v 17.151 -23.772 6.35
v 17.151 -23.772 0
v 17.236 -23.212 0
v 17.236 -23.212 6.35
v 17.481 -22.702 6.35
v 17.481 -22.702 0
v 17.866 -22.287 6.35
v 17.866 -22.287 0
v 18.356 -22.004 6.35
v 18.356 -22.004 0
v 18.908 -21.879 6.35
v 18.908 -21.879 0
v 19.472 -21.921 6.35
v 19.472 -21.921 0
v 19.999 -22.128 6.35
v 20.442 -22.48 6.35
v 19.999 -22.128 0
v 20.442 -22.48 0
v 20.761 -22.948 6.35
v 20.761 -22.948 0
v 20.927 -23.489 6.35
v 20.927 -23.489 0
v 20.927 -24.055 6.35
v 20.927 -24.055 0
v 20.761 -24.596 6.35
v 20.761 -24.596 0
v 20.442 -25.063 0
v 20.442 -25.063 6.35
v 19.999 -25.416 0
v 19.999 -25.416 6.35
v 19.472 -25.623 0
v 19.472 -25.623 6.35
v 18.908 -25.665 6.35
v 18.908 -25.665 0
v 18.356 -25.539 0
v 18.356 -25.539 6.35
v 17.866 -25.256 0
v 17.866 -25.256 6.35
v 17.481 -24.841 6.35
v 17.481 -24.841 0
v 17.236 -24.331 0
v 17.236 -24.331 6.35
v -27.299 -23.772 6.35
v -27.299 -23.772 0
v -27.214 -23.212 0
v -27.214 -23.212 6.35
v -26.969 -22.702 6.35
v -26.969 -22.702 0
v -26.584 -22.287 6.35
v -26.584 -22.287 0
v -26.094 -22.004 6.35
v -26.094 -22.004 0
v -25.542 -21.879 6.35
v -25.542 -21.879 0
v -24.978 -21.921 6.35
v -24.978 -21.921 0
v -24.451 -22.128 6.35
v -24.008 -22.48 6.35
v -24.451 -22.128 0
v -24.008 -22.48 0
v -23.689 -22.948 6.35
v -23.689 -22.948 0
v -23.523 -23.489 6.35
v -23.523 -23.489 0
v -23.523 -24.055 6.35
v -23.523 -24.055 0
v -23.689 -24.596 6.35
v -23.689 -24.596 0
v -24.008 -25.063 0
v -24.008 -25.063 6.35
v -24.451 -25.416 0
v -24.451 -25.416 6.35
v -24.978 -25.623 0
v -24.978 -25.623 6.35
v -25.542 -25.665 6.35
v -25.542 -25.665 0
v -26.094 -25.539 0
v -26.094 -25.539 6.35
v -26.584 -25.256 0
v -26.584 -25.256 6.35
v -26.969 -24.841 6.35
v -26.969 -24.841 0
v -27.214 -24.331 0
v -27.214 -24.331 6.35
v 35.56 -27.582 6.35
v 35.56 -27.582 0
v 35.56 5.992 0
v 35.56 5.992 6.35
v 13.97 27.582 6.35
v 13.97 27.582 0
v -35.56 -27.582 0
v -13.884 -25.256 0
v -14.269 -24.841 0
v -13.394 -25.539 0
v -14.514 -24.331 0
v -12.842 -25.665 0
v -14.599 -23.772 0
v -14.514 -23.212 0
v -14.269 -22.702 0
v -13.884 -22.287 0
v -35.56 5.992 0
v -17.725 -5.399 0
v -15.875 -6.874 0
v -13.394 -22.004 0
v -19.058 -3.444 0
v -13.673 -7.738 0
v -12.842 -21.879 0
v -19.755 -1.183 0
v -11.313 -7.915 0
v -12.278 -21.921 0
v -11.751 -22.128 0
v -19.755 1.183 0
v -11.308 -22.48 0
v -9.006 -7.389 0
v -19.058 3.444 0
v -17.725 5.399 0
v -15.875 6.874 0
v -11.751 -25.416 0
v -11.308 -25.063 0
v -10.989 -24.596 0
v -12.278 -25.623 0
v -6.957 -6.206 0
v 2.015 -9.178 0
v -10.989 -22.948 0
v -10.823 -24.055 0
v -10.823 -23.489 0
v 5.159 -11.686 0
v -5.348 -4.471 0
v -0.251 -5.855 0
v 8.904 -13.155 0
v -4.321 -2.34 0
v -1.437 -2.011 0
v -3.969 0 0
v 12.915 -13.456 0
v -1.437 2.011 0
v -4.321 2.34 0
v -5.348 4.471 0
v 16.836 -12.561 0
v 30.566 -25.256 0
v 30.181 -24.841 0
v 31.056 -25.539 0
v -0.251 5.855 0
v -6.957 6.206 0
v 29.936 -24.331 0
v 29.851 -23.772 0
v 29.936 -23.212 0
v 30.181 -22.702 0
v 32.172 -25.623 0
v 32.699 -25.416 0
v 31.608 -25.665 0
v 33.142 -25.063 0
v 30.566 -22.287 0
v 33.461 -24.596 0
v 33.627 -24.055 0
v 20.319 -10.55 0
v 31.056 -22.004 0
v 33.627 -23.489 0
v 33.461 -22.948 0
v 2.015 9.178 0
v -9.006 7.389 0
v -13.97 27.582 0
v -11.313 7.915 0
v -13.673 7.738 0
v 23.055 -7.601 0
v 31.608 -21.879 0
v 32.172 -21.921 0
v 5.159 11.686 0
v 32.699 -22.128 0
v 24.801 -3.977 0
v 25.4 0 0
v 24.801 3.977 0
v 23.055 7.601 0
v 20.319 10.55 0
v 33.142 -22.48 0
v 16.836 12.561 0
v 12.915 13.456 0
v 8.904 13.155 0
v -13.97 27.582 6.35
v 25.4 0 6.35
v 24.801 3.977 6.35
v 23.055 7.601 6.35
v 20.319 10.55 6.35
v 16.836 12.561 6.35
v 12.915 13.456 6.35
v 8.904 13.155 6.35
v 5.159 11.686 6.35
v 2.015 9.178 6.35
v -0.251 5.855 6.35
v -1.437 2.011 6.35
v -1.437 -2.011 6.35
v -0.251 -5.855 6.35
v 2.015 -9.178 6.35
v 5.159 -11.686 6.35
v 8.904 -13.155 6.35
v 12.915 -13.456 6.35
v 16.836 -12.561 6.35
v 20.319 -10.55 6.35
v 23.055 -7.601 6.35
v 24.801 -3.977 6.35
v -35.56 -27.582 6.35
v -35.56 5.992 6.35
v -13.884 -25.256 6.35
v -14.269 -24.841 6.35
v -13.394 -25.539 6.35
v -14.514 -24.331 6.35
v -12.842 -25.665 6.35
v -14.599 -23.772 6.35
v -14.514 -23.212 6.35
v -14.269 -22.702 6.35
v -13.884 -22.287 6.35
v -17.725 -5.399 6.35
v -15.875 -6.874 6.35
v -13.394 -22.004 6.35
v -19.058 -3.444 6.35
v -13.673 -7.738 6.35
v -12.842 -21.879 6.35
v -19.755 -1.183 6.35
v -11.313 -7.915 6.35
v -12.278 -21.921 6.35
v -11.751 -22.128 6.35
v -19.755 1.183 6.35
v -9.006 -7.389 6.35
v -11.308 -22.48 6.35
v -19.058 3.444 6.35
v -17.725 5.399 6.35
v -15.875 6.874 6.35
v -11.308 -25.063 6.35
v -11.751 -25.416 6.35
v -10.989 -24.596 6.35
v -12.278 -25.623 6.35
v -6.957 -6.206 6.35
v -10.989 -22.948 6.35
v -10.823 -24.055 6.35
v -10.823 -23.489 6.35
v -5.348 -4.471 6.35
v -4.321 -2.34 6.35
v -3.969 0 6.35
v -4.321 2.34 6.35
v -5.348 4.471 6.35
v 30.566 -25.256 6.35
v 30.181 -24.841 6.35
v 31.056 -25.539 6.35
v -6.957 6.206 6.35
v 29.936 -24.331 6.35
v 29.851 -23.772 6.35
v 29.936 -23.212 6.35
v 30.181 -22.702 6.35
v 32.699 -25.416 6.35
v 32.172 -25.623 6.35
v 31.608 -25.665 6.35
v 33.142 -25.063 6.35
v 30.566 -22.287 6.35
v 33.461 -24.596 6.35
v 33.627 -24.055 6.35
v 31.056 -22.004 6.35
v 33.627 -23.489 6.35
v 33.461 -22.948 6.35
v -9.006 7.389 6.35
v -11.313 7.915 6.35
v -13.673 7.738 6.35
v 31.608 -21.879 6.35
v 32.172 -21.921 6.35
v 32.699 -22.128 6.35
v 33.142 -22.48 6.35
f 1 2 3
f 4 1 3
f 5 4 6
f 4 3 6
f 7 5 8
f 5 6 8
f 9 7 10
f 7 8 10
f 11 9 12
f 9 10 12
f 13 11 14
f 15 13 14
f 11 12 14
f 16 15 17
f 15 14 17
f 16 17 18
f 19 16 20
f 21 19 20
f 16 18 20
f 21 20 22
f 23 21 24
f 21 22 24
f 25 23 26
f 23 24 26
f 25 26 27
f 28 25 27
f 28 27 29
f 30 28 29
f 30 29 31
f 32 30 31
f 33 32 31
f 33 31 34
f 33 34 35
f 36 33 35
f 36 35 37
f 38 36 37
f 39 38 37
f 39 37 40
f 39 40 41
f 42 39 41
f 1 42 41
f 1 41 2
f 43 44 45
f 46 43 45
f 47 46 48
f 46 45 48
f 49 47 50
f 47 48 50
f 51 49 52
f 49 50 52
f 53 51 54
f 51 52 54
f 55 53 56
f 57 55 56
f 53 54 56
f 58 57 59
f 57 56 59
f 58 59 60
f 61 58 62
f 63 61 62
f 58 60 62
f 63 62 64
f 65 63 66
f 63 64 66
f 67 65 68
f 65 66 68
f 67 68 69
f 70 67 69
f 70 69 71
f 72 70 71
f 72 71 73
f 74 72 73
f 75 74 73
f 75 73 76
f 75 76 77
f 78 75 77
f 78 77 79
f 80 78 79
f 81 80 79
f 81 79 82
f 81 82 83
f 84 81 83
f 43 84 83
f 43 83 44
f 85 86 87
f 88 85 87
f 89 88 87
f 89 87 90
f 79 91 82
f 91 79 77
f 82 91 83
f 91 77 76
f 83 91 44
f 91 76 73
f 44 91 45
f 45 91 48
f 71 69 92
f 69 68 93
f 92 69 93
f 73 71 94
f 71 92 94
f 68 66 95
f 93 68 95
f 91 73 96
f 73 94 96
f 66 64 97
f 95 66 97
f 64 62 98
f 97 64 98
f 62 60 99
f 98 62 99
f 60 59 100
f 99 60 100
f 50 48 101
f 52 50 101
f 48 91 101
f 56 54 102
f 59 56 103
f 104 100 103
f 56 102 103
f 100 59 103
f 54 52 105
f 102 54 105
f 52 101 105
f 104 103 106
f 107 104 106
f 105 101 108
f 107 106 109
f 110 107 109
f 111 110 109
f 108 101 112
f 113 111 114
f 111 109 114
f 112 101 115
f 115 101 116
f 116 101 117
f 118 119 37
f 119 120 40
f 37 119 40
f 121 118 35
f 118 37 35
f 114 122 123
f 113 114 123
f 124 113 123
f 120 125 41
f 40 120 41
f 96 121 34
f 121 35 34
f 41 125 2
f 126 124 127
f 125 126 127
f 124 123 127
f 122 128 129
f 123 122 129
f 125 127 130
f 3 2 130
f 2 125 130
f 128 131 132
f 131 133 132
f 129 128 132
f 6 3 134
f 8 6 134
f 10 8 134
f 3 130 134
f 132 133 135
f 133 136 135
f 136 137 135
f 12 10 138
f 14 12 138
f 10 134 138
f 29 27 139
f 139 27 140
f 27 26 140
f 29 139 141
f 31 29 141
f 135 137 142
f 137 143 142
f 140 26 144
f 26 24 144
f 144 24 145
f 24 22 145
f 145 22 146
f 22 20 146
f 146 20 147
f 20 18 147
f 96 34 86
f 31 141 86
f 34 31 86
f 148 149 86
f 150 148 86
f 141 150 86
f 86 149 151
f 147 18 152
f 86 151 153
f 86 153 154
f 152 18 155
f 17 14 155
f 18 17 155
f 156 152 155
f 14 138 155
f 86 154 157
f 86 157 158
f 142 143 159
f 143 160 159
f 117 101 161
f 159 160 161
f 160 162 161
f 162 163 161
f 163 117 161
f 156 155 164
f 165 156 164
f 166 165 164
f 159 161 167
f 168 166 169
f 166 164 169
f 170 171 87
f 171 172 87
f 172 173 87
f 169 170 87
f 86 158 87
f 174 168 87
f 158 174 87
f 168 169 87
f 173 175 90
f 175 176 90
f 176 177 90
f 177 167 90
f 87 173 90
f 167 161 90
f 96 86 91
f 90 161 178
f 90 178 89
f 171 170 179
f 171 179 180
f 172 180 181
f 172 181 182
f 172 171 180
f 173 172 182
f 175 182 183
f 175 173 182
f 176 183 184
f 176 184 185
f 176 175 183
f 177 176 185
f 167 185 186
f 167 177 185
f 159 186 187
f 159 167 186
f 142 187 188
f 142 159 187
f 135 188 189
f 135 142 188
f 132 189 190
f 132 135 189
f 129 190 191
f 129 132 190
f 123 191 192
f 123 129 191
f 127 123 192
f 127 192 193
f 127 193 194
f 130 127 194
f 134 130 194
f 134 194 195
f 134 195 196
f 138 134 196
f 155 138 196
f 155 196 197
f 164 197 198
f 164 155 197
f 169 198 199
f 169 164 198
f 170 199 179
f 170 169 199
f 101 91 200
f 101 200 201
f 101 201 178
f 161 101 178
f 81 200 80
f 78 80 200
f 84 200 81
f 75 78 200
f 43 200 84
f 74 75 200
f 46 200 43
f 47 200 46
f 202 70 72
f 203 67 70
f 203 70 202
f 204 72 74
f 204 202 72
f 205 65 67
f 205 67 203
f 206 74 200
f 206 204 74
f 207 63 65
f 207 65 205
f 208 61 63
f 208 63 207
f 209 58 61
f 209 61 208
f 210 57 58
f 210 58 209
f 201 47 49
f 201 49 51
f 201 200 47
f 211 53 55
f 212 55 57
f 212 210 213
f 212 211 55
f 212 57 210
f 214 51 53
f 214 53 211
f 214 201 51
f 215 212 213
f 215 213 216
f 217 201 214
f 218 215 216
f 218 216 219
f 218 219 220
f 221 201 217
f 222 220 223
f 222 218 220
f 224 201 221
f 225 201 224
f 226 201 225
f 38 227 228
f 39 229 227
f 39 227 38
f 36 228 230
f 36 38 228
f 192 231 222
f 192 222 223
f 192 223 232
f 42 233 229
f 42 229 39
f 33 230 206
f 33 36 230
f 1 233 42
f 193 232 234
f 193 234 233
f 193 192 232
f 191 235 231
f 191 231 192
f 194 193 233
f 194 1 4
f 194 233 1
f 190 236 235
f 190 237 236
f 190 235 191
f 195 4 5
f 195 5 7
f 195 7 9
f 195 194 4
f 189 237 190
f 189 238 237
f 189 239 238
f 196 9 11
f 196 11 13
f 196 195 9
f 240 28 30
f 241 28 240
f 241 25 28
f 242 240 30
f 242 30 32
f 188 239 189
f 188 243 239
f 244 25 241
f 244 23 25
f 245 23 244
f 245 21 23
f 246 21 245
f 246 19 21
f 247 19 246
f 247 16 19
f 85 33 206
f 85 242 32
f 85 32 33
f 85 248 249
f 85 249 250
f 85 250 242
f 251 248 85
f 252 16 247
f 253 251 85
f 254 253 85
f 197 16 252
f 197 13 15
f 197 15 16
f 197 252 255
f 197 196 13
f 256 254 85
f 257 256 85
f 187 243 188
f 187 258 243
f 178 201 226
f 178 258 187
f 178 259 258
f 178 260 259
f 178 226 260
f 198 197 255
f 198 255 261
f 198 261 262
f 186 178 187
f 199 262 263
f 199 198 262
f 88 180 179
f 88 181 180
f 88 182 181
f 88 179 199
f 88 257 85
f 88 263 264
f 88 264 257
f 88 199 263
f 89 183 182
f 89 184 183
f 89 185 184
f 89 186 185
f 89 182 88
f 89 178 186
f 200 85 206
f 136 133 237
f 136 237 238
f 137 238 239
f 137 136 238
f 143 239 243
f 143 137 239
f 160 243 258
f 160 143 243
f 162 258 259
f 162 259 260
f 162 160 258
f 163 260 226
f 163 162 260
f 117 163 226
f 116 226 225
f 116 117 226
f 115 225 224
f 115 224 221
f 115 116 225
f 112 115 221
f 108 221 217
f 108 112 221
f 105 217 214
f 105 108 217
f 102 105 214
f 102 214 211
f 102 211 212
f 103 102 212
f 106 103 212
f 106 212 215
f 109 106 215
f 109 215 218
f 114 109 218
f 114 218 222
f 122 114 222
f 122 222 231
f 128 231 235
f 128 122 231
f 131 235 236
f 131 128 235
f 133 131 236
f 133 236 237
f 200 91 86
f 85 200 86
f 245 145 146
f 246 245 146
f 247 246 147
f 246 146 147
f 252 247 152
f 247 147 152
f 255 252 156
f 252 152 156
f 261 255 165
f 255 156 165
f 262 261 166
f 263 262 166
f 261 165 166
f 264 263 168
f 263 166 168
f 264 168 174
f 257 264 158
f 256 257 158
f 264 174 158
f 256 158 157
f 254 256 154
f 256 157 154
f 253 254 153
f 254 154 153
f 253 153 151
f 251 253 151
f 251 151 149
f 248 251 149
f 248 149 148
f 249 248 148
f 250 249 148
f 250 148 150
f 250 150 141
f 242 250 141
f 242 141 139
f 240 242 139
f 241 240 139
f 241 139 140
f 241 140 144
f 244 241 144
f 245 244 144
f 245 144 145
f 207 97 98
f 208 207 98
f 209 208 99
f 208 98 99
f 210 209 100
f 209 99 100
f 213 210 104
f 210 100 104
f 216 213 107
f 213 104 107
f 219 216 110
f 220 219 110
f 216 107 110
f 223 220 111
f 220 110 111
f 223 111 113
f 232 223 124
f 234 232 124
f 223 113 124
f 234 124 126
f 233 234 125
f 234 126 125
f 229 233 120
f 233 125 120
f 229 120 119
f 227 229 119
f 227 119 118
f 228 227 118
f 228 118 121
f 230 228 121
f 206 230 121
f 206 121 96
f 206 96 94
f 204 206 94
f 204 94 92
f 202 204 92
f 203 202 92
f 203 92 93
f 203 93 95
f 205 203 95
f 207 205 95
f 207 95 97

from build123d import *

# Parameters (mm, degrees)
SKETCH1_W             = 71.12
SKETCH1_H             = 55.16372
SKETCH1_R             = 13.49375
SKETCH1_R_2           = 7.9375
BOSS_EXTRUDE1_DEPTH   = 6.35
F_6_CLEARANCE_HOLE1_D = 3.7973
CUT_EXTRUDE1_DEPTH    = 46.448818478


with BuildPart() as part:
    # Sketch1 → Boss-Extrude1 (new body)
    with BuildSketch(Plane.XY):
        Rectangle(SKETCH1_W, SKETCH1_H)
        with Locations((11.90625, 0)):
            Circle(SKETCH1_R, mode=Mode.SUBTRACT)
        with Locations((-11.90625, 0)):
            Circle(SKETCH1_R_2, mode=Mode.SUBTRACT)
    extrude(amount=BOSS_EXTRUDE1_DEPTH)

    # #6 Clearance Hole1 (through all)
    with Locations(Plane.XY.offset(6.35)):
        with Locations((-25.4, -23.77186), (-12.7, -23.77186), (19.05, -23.77186), (31.75, -23.77186)):
            Hole(F_6_CLEARANCE_HOLE1_D / 2)

    # Sketch4 → Cut-Extrude1 (cut, through all)
    with BuildSketch(Plane.XY.offset(6.35)):
        Polygon((-35.56, 5.99186), (-13.97, 27.58186), (-35.56, 27.58186), align=None)
        Polygon((35.56, 5.99186), (13.97, 27.58186), (35.56, 27.58186), align=None)
    extrude(amount=-CUT_EXTRUDE1_DEPTH, mode=Mode.SUBTRACT)


solid = part.part
